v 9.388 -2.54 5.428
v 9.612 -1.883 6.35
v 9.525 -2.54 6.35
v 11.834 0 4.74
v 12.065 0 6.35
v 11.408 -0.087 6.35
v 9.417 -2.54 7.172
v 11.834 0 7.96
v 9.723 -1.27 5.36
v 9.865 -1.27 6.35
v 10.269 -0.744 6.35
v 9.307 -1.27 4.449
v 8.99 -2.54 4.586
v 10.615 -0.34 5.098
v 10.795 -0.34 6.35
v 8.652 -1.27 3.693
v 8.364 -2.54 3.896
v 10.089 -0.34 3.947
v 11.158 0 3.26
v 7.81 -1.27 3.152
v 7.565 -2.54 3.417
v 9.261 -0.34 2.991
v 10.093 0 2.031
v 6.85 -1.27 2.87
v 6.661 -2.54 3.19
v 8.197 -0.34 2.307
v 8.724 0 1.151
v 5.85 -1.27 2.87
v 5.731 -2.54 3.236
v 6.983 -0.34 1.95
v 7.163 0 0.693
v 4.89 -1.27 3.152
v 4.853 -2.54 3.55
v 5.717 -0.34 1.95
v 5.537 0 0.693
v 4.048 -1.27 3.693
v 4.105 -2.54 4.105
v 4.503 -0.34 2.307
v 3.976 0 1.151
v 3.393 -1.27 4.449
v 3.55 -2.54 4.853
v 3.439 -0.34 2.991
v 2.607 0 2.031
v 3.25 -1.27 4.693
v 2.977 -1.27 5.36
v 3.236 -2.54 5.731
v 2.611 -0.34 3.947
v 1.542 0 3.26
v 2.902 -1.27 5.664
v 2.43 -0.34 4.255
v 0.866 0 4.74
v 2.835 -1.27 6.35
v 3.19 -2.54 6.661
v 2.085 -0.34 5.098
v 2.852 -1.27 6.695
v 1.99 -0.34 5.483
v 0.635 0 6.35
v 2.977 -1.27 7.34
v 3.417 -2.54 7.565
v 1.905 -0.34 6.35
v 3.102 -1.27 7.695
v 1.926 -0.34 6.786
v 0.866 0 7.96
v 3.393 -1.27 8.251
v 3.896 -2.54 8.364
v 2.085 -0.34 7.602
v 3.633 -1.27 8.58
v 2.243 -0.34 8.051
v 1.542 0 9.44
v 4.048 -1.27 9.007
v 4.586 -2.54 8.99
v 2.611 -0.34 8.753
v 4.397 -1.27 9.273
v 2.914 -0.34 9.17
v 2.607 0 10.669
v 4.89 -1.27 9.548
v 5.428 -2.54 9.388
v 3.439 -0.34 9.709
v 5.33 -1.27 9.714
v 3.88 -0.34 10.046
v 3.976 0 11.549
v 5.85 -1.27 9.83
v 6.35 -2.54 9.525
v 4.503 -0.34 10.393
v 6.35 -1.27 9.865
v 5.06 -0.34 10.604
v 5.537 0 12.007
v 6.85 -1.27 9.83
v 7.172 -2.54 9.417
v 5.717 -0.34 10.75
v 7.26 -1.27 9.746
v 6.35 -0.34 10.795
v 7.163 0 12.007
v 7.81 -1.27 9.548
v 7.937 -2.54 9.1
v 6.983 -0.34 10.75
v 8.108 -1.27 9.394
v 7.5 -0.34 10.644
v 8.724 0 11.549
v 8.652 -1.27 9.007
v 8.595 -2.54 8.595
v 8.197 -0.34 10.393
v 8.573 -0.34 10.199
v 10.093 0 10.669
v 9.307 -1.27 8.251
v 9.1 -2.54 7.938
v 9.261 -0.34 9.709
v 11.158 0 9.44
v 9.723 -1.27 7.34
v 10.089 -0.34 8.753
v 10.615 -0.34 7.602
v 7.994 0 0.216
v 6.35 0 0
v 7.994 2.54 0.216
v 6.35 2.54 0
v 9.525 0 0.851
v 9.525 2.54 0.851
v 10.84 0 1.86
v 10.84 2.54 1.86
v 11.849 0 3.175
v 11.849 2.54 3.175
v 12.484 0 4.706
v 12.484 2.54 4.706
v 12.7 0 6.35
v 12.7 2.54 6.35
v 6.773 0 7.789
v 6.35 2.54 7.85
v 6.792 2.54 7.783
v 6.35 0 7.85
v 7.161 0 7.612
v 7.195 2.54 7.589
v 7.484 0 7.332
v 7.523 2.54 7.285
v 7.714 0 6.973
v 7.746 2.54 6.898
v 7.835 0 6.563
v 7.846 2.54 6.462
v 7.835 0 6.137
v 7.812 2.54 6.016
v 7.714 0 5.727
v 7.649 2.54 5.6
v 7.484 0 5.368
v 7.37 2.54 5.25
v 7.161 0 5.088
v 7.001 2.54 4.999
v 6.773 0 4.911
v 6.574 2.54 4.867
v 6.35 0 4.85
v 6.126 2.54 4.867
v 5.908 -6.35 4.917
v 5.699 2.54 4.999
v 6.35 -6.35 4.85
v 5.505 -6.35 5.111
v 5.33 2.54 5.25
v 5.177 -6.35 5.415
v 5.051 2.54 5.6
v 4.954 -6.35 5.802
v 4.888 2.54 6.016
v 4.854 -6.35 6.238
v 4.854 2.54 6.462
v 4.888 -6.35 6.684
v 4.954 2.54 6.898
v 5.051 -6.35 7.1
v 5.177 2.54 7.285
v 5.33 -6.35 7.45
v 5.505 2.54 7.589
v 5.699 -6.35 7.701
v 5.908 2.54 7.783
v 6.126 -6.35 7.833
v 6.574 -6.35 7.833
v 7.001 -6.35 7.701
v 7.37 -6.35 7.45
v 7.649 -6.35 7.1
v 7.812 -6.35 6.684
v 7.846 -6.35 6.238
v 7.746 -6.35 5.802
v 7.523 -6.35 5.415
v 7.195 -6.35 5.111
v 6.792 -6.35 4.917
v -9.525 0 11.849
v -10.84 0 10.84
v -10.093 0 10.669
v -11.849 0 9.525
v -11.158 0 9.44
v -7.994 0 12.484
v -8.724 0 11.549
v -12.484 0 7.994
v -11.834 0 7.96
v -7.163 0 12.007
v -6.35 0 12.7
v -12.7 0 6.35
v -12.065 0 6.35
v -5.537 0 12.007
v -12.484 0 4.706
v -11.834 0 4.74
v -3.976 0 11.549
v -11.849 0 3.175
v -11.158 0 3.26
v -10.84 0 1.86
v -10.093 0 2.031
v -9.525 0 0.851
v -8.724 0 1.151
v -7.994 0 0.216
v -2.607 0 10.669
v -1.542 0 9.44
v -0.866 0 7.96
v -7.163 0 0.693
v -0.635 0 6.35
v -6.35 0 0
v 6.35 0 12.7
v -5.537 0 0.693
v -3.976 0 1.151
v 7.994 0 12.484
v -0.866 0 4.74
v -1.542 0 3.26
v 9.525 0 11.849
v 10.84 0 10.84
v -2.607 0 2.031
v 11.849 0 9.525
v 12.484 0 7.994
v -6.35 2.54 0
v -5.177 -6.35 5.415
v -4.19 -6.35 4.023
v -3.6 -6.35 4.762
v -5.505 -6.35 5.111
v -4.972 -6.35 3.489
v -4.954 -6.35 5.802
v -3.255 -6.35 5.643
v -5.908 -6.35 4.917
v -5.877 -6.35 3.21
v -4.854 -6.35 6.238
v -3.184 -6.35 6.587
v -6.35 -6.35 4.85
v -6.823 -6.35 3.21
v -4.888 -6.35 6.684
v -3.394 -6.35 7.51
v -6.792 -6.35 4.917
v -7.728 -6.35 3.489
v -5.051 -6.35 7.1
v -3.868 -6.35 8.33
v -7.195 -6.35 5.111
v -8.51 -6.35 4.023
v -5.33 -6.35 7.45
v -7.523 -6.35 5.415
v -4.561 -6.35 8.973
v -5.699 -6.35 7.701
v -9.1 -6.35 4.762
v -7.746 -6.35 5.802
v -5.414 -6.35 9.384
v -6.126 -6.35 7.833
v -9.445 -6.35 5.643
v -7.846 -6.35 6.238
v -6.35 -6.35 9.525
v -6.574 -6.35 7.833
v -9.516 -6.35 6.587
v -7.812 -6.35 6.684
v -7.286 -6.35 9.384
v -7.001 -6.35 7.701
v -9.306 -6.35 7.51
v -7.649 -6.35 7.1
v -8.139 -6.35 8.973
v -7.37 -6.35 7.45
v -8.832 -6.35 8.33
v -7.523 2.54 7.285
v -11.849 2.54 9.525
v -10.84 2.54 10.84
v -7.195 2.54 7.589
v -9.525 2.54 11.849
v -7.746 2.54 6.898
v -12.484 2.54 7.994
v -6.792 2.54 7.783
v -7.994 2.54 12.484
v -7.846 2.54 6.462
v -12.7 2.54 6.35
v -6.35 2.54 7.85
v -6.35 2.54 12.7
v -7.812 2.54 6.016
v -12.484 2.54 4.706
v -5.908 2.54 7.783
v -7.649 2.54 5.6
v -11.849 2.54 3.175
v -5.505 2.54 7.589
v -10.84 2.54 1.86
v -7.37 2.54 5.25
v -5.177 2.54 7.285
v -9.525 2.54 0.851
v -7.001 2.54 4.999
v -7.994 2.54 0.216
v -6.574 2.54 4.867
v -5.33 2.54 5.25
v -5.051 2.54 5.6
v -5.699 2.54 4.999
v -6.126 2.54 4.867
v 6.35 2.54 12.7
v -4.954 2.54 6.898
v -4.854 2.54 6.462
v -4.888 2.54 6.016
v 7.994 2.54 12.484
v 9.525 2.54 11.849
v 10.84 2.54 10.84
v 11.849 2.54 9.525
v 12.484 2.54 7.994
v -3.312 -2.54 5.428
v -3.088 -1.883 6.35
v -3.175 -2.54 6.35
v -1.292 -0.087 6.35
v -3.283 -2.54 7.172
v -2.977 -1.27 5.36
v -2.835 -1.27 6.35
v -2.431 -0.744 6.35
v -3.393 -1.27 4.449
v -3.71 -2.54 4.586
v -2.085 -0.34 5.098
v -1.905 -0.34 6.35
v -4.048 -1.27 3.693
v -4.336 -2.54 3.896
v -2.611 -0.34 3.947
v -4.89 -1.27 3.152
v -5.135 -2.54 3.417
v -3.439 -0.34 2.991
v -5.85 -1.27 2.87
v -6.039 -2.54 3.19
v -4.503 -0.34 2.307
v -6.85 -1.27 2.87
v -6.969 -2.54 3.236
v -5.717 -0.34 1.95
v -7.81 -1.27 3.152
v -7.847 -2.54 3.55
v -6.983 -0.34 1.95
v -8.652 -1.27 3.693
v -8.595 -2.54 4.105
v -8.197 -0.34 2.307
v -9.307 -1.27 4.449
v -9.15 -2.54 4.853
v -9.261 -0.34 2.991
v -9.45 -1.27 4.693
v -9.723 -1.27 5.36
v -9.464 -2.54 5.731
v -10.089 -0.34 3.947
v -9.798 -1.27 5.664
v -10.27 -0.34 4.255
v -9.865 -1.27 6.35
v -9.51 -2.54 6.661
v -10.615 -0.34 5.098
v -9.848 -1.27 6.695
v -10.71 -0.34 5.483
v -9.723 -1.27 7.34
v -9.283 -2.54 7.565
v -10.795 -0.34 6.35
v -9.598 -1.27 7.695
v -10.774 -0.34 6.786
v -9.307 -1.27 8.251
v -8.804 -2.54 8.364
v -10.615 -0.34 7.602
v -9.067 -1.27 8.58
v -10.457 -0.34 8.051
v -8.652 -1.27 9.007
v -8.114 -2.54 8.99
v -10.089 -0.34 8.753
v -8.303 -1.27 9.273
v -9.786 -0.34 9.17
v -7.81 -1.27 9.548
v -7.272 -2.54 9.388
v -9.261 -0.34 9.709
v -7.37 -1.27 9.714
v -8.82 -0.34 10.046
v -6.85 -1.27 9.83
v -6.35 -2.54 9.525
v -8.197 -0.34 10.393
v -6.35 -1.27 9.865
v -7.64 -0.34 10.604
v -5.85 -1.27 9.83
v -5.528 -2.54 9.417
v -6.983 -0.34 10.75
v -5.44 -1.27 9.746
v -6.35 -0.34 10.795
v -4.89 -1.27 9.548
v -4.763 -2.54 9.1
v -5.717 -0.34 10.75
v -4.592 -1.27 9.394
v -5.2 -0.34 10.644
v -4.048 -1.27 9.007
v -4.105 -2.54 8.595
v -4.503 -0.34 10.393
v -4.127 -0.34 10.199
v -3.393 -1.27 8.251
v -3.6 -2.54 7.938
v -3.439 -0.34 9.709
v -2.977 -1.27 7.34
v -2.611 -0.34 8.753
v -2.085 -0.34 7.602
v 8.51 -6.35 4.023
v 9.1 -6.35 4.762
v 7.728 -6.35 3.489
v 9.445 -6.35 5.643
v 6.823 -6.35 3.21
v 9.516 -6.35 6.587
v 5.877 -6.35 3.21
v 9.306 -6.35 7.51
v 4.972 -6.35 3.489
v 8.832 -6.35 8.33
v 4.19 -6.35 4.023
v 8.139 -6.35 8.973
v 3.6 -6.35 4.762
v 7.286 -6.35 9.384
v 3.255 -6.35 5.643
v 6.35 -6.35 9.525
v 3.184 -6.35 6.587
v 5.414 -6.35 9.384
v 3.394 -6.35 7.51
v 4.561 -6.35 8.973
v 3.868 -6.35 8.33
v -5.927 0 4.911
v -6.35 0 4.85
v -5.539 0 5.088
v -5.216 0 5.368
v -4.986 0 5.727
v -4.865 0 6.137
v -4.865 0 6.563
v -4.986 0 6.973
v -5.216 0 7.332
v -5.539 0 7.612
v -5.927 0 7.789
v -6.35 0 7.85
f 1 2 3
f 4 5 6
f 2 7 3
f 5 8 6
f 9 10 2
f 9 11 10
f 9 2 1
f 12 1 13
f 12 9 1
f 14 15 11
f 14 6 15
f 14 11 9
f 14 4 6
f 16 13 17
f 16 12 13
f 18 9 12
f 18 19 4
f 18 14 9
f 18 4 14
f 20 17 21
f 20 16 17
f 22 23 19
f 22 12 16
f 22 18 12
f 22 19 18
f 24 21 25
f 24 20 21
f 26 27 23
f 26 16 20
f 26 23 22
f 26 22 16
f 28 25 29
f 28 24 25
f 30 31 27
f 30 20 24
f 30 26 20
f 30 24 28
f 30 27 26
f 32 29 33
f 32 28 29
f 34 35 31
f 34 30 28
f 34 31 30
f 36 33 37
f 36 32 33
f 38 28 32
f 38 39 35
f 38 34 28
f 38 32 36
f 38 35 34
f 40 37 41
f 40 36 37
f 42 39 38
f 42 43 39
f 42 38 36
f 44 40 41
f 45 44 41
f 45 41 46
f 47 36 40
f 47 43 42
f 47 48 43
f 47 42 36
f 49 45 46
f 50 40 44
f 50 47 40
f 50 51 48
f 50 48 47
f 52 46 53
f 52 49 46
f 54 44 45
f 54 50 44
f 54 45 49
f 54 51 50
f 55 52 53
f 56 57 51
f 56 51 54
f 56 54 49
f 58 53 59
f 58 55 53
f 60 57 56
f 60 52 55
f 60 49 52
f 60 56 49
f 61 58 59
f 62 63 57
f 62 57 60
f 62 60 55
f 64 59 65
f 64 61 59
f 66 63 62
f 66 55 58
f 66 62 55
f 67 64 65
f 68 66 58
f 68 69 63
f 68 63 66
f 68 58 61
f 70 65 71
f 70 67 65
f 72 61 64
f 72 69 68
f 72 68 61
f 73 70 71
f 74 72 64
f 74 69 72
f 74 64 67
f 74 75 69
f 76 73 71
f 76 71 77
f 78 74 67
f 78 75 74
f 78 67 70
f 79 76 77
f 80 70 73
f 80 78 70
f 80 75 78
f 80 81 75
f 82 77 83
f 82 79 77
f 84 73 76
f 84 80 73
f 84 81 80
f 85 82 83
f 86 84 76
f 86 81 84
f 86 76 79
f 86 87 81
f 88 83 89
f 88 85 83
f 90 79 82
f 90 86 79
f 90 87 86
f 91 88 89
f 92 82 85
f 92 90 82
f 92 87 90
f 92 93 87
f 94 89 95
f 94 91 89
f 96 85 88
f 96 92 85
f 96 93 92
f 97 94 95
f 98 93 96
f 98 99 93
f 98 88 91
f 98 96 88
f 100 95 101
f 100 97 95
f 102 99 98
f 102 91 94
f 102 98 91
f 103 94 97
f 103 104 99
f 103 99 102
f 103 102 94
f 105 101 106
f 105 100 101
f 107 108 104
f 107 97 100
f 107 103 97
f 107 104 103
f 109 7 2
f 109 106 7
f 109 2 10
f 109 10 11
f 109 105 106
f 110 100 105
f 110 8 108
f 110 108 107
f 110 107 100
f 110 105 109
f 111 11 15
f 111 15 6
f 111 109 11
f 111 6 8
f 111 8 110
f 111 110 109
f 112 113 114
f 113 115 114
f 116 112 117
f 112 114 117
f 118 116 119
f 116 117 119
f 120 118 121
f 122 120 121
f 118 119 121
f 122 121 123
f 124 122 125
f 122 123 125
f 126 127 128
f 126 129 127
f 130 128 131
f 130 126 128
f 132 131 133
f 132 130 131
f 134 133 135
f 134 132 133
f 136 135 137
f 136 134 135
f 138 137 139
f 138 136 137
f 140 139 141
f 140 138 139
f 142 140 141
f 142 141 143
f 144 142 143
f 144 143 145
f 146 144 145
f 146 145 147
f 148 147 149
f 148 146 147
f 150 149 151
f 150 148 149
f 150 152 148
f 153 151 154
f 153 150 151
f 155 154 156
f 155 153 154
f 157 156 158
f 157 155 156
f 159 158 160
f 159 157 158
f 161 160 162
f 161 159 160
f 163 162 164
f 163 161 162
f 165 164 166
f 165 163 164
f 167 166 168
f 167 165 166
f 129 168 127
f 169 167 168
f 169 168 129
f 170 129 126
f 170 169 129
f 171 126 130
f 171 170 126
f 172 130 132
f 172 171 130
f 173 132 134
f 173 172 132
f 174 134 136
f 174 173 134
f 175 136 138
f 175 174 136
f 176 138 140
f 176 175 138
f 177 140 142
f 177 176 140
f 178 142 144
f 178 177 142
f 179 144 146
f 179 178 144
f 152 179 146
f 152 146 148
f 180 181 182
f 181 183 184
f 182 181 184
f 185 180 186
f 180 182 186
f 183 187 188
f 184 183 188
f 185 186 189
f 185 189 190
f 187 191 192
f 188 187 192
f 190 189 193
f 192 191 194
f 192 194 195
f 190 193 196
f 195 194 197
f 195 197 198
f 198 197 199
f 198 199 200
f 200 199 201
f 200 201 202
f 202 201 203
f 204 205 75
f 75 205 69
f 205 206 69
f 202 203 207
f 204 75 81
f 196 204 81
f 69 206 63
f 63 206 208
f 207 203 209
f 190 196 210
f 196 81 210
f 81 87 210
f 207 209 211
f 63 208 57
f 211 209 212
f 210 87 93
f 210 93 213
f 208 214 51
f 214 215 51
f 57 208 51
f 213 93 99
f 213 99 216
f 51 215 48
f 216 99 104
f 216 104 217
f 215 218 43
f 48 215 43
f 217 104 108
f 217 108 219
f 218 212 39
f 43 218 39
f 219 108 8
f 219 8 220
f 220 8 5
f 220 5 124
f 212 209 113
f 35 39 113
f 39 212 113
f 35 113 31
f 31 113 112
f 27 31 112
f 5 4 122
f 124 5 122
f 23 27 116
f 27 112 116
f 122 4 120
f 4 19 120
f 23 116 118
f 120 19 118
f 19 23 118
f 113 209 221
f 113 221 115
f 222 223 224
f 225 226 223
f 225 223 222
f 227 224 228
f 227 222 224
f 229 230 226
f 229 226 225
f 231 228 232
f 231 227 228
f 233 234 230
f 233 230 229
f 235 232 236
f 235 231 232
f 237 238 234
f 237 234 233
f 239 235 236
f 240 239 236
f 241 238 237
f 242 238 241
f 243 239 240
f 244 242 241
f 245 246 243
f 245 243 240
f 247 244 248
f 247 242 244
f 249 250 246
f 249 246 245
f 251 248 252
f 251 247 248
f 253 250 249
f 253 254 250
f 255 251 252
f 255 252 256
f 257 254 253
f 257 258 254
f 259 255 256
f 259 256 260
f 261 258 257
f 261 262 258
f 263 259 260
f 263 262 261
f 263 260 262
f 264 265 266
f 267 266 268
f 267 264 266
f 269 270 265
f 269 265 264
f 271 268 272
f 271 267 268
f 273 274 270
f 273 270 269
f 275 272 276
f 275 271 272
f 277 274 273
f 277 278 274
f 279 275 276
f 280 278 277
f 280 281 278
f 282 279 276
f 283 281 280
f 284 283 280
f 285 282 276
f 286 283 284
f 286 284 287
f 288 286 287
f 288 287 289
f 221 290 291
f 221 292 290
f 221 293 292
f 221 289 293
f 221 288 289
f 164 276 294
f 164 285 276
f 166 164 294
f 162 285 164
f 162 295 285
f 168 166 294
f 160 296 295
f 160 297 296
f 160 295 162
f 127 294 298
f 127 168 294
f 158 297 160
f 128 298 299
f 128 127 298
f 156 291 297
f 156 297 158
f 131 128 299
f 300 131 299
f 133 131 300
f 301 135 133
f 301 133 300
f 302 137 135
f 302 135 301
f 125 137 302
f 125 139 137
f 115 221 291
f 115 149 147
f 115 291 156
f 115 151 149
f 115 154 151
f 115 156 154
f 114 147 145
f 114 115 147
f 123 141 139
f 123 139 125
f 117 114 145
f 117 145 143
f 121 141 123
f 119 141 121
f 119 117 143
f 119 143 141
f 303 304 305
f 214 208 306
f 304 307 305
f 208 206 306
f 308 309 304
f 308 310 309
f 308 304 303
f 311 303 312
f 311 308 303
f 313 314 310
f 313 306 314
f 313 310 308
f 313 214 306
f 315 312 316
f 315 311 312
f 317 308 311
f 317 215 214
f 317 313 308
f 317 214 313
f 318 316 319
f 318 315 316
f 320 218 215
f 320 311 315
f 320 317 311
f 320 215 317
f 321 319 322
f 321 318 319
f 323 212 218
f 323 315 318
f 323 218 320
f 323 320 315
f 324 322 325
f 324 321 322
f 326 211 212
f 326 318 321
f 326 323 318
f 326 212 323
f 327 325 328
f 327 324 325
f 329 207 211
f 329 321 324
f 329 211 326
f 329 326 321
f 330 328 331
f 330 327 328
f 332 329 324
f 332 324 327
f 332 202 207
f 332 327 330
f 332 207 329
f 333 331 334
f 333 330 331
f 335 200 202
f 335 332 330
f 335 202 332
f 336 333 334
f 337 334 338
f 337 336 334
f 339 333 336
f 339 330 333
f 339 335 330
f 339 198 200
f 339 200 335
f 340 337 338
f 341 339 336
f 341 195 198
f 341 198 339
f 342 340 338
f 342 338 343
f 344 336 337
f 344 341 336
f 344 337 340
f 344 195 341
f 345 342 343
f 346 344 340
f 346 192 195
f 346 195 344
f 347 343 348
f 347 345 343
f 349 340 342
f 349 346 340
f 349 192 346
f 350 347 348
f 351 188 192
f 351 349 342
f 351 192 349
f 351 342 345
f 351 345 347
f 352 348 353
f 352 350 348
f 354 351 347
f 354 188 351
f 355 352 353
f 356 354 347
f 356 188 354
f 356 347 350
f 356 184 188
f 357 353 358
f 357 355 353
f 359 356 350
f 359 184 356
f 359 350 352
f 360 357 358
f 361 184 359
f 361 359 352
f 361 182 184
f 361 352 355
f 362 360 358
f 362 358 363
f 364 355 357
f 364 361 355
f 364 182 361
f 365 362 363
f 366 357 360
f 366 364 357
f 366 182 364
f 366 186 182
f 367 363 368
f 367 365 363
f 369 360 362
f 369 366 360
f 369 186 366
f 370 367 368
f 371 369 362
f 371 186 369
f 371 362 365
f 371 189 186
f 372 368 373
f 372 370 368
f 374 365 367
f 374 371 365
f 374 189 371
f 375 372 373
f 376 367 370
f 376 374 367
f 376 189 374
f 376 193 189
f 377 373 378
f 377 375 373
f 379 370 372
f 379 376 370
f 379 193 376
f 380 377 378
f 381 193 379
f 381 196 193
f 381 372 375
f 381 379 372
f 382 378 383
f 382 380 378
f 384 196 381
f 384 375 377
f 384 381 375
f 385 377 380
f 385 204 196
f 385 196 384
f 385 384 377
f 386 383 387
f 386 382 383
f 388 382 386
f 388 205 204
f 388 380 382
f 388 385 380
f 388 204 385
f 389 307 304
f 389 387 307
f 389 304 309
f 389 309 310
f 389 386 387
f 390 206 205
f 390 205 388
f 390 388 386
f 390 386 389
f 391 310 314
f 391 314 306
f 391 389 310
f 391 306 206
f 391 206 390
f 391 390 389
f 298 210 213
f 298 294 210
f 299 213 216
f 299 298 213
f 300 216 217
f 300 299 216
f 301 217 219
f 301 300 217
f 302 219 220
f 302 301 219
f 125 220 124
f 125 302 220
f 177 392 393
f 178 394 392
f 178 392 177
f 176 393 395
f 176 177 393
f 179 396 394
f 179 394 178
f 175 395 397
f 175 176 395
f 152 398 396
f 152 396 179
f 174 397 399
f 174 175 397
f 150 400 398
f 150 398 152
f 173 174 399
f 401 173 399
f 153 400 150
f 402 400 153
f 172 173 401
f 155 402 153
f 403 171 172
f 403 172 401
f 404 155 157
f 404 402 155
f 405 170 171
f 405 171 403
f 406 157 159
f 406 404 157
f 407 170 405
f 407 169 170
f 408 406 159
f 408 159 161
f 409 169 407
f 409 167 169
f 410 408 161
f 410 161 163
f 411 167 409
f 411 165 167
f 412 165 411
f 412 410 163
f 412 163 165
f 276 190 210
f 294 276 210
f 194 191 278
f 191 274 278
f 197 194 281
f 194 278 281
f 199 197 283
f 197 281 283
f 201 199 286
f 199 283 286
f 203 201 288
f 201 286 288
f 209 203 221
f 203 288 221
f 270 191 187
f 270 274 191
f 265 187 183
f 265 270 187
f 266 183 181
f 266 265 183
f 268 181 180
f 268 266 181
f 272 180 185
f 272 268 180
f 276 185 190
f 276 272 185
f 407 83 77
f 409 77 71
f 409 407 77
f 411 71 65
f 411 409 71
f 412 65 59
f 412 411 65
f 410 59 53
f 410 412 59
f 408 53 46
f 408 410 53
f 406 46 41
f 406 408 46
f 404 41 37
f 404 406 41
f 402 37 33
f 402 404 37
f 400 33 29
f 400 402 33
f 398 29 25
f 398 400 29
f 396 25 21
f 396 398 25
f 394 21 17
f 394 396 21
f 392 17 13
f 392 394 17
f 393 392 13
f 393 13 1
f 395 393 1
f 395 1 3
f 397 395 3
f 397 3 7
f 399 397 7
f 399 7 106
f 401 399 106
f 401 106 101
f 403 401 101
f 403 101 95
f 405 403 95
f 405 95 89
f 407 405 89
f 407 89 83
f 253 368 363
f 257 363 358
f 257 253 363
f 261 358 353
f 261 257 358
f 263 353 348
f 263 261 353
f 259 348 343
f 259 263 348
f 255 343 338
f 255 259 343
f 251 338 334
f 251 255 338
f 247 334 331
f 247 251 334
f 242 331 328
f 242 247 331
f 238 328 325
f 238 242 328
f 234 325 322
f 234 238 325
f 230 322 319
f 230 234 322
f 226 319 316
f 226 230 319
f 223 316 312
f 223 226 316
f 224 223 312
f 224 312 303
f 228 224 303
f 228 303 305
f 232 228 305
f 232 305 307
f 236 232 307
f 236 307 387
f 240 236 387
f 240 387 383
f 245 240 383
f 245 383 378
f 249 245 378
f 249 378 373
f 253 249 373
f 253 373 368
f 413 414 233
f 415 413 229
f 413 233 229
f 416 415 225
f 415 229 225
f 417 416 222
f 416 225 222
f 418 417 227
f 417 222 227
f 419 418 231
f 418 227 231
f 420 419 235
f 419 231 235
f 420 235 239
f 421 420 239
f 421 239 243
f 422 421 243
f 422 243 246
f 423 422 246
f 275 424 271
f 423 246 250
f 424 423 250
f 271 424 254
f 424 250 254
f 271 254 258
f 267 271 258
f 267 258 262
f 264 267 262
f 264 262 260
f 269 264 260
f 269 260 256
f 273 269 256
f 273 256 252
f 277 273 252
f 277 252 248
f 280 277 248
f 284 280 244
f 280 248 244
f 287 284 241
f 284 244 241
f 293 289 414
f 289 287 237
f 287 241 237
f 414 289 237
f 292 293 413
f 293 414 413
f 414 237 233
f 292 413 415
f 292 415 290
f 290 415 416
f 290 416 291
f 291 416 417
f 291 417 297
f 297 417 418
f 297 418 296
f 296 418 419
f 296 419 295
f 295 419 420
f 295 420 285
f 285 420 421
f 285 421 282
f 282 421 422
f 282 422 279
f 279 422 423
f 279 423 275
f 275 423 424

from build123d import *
from build123d.topology import SkipClean

# Parameters (mm, degrees)
SKETCH1_W           = 25.4
SKETCH1_H           = 25.4
SKETCH1_R           = 1.5
BOSS_EXTRUDE1_DEPTH = 2.54
SKETCH3_W           = 25.4
SKETCH3_H           = 12.7
CUT_EXTRUDE1_DEPTH  = 19.139228208
BOSS_EXTRUDE2_START = 6.35
SKETCH4_R           = 3.175
SKETCH4_R_2         = 1.5
BOSS_EXTRUDE2_DEPTH = 6.35
FILLET1_R           = 6.35


with BuildPart() as part:
    # Sketch1 → Boss-Extrude1 (new body)
    with BuildSketch(Plane(origin=(0, 0, 0), x_dir=(1, 0, 0), z_dir=(0, 1, 0))):
        Rectangle(SKETCH1_W, SKETCH1_H)
        with Locations(Location((-6.35, 6.35, 0), (0, 0, 270))):
            Circle(SKETCH1_R, mode=Mode.SUBTRACT)
        with Locations(Location((6.35, 6.35, 0), (0, 0, 270))):
            Circle(SKETCH1_R, mode=Mode.SUBTRACT)
        with Locations(Location((6.35, -6.35, 0), (0, 0, 270))):
            Circle(SKETCH1_R, mode=Mode.SUBTRACT)
        with Locations(Location((-6.35, -6.35, 0), (0, 0, 270))):
            Circle(SKETCH1_R, mode=Mode.SUBTRACT)
    extrude(amount=BOSS_EXTRUDE1_DEPTH)

    # Sketch3 → Cut-Extrude1 (cut, through all)
    with BuildSketch(Plane.XZ):
        with Locations((0, -6.35)):
            Rectangle(SKETCH3_W, SKETCH3_H)
    extrude(amount=-CUT_EXTRUDE1_DEPTH, mode=Mode.SUBTRACT)

    # Sketch4 → Boss-Extrude2 (add)
    # profile 1 of 2: a face of its own
    with SkipClean():  # the faces are left unmerged after this step: merging them gives an invalid solid
        with BuildSketch(Plane.XZ.offset(BOSS_EXTRUDE2_START)):
            with Locations(Location((-6.35, 6.35, 0), (0, 0, 90))):
                Circle(SKETCH4_R)
            with Locations(Location((-6.35, 6.35, 0), (0, 0, 270))):
                Circle(SKETCH4_R_2, mode=Mode.SUBTRACT)
        # profile 2 of 2: a face of its own
        with BuildSketch(Plane.XZ.offset(BOSS_EXTRUDE2_START)):
            with Locations(Location((6.35, 6.35, 0), (0, 0, 90))):
                Circle(SKETCH4_R)
            with Locations(Location((6.35, 6.35, 0), (0, 0, 270))):
                Circle(SKETCH4_R_2, mode=Mode.SUBTRACT)
        extrude(amount=-BOSS_EXTRUDE2_DEPTH)

    # Fillet1
    fillet1_edges = [part.edges().sort_by_distance(p)[0] for p in [
        (12.7, 1.27, 0),
        (-12.7, 1.27, 0),
        (-12.7, 1.27, 12.7),
        (12.7, 1.27, 12.7),
    ]]
    fillet(fillet1_edges, radius=FILLET1_R - 0.0001)  # a hair under: the kernel refuses the full size

    # Fillet2: read off the stored shape, not the designer's step
    # Fillet2 outline → Fillet2 (revolve)
    with BuildSketch(Plane(origin=(6.35, 0, 6.35), x_dir=(1, 0, 0), z_dir=(0, 0, 1))):
        with BuildLine():
            ThreePointArc((3.175, -2.54), (3.918948776, -0.743948776), (5.715, 0))
            Line((5.715, 0), (3.175, 0))
            Line((3.175, 0), (3.175, -2.54))
        make_face()
    revolve(axis=Axis((6.35, 0, 6.35), (0, 1, 0)))

    # Fillet2 2 outline → Fillet2 2 (revolve)
    with BuildSketch(Plane(origin=(-6.35, 0, 6.35), x_dir=(1, 0, 0), z_dir=(0, 0, 1))):
        with BuildLine():
            ThreePointArc((3.175, -2.54), (3.918948776, -0.743948776), (5.715, 0))
            Line((5.715, 0), (3.175, 0))
            Line((3.175, 0), (3.175, -2.54))
        make_face()
    revolve(axis=Axis((-6.35, 0, 6.35), (0, 1, 0)))


solid = part.part
